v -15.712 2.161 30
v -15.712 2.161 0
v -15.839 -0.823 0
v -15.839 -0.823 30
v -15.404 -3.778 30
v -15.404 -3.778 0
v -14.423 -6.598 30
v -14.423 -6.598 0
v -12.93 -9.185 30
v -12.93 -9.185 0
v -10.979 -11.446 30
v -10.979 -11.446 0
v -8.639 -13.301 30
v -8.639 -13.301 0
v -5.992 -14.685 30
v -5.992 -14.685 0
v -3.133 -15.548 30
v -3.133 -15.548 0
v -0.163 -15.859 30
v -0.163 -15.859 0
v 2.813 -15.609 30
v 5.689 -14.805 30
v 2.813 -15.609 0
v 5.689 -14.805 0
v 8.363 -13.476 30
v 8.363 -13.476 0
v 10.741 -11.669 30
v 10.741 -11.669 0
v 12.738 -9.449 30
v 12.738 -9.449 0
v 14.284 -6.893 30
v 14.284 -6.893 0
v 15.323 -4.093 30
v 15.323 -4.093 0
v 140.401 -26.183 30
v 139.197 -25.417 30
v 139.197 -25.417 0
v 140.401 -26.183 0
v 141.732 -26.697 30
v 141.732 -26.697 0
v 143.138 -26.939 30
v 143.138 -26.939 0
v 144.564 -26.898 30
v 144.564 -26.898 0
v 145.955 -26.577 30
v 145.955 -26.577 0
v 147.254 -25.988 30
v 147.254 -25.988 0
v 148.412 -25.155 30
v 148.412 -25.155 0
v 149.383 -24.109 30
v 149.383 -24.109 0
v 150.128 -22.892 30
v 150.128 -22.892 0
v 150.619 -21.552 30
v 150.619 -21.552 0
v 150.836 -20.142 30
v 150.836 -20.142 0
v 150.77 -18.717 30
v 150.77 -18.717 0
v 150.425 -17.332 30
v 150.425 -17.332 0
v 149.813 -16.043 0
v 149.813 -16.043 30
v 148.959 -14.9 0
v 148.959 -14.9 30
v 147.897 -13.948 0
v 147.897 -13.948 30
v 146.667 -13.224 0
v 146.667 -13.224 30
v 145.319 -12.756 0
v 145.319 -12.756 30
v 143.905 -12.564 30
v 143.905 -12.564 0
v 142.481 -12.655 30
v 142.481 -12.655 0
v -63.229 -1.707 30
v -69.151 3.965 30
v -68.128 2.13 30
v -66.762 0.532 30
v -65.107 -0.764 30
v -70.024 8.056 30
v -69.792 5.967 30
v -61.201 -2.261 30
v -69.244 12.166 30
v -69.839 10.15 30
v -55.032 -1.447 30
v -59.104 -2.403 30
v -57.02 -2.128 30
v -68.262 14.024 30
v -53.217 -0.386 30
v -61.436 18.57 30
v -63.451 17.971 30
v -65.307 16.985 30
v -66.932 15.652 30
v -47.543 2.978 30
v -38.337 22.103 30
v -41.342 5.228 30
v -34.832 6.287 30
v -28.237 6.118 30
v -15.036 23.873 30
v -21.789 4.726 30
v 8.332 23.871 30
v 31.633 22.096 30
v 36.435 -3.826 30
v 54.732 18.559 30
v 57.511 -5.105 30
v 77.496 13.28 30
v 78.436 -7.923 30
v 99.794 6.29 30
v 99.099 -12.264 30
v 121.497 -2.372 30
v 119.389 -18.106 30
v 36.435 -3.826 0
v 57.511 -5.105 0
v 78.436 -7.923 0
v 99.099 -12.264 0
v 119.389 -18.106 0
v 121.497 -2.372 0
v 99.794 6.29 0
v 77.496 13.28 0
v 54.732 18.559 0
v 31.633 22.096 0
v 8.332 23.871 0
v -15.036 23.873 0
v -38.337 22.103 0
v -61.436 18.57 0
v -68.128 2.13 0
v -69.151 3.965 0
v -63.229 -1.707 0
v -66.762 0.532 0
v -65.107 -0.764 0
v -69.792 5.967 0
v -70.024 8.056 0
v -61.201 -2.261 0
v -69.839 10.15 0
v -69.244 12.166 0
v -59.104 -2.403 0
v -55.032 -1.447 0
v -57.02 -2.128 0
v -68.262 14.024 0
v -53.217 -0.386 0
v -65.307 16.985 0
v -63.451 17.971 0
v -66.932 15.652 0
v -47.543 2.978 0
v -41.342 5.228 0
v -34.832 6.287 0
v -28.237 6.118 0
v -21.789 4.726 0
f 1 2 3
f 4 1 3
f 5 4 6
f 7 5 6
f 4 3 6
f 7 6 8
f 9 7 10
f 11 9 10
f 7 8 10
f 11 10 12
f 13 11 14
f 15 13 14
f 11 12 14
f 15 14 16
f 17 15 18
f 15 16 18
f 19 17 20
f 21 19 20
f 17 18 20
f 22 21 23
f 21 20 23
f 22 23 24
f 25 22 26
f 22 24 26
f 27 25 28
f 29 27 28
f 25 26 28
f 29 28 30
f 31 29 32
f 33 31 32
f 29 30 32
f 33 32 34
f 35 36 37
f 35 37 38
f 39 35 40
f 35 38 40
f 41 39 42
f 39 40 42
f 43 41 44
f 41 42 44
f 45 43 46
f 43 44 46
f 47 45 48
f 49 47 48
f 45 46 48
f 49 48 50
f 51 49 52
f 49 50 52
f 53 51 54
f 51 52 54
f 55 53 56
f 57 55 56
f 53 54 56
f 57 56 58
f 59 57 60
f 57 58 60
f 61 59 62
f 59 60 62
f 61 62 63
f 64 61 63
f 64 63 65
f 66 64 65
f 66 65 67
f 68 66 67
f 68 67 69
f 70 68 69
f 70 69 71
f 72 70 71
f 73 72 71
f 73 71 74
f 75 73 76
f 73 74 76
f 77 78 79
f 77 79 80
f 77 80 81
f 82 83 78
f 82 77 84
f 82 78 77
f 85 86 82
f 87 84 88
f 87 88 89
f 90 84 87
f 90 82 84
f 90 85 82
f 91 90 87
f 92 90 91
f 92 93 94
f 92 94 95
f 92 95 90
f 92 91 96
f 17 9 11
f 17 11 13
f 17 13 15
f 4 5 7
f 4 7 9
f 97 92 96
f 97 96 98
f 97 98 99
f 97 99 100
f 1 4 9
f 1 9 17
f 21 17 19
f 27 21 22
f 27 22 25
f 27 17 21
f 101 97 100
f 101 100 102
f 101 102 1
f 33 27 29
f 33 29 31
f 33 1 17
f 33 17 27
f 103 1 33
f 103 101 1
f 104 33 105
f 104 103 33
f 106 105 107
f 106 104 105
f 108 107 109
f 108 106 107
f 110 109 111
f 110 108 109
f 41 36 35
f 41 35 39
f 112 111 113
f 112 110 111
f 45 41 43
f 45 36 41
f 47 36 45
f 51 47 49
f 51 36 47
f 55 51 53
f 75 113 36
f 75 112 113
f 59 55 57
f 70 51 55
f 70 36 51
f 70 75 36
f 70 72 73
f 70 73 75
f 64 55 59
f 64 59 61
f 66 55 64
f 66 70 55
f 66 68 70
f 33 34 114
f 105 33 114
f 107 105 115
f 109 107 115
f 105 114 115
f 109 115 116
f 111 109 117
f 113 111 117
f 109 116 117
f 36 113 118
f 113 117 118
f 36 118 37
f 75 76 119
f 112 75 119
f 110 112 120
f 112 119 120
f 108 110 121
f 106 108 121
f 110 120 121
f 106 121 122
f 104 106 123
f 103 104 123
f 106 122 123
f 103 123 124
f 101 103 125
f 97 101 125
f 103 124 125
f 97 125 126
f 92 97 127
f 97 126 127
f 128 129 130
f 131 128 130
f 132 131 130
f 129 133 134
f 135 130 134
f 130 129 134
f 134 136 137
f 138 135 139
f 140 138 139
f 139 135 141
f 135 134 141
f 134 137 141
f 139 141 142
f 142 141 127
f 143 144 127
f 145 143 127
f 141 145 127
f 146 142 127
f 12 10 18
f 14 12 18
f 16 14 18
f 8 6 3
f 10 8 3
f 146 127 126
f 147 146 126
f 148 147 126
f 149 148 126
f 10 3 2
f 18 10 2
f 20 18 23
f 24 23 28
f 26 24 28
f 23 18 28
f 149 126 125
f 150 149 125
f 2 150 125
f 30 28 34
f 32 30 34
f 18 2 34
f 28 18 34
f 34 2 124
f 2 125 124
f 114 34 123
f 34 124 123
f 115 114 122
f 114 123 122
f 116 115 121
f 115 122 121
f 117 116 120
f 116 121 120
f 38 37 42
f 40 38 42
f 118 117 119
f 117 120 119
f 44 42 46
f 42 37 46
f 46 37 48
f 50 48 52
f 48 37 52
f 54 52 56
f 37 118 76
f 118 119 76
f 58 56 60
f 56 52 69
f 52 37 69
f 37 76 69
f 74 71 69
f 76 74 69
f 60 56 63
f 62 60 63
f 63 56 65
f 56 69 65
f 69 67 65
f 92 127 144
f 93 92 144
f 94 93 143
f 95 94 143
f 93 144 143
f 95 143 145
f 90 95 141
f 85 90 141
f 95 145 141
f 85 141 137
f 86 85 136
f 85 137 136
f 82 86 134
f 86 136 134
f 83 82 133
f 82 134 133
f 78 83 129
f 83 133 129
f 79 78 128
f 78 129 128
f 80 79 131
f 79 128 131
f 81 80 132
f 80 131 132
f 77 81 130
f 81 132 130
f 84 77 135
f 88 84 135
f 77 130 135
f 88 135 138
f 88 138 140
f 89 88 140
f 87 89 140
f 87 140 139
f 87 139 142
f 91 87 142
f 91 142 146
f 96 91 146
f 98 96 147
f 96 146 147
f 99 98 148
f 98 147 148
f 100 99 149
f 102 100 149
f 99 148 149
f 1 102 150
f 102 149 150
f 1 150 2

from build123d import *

# Parameters (mm, degrees)
EXTRUDE_1_DEPTH = 30


with BuildPart() as part:
    # 草图1 → 凸台-拉伸1 (new body)
    with BuildSketch(Plane.XY):
        with BuildLine():
            ThreePointArc((-15.712331266, 2.160724411), (-3.13309904, -15.547661374), (15.322874863, -4.093359222))
            ThreePointArc((15.322874863, -4.093359222), (78.436182954, -7.922682958), (139.19729869, -25.416687445))
            ThreePointArc((139.19729869, -25.416687445), (150.619110519, -21.552265679), (142.48119841, -12.654742004))
            ThreePointArc((142.48119841, -12.654742004), (43.215780263, 20.546958672), (-61.436350738, 18.570182304))
            ThreePointArc((-61.436350738, 18.570182304), (-69.151102392, 3.965497782), (-53.217470305, -0.385774624))
            ThreePointArc((-53.217470305, -0.385774624), (-34.831522248, 6.287119165), (-15.712331266, 2.160724411))
        make_face()
    extrude(amount=EXTRUDE_1_DEPTH)


solid = part.part
